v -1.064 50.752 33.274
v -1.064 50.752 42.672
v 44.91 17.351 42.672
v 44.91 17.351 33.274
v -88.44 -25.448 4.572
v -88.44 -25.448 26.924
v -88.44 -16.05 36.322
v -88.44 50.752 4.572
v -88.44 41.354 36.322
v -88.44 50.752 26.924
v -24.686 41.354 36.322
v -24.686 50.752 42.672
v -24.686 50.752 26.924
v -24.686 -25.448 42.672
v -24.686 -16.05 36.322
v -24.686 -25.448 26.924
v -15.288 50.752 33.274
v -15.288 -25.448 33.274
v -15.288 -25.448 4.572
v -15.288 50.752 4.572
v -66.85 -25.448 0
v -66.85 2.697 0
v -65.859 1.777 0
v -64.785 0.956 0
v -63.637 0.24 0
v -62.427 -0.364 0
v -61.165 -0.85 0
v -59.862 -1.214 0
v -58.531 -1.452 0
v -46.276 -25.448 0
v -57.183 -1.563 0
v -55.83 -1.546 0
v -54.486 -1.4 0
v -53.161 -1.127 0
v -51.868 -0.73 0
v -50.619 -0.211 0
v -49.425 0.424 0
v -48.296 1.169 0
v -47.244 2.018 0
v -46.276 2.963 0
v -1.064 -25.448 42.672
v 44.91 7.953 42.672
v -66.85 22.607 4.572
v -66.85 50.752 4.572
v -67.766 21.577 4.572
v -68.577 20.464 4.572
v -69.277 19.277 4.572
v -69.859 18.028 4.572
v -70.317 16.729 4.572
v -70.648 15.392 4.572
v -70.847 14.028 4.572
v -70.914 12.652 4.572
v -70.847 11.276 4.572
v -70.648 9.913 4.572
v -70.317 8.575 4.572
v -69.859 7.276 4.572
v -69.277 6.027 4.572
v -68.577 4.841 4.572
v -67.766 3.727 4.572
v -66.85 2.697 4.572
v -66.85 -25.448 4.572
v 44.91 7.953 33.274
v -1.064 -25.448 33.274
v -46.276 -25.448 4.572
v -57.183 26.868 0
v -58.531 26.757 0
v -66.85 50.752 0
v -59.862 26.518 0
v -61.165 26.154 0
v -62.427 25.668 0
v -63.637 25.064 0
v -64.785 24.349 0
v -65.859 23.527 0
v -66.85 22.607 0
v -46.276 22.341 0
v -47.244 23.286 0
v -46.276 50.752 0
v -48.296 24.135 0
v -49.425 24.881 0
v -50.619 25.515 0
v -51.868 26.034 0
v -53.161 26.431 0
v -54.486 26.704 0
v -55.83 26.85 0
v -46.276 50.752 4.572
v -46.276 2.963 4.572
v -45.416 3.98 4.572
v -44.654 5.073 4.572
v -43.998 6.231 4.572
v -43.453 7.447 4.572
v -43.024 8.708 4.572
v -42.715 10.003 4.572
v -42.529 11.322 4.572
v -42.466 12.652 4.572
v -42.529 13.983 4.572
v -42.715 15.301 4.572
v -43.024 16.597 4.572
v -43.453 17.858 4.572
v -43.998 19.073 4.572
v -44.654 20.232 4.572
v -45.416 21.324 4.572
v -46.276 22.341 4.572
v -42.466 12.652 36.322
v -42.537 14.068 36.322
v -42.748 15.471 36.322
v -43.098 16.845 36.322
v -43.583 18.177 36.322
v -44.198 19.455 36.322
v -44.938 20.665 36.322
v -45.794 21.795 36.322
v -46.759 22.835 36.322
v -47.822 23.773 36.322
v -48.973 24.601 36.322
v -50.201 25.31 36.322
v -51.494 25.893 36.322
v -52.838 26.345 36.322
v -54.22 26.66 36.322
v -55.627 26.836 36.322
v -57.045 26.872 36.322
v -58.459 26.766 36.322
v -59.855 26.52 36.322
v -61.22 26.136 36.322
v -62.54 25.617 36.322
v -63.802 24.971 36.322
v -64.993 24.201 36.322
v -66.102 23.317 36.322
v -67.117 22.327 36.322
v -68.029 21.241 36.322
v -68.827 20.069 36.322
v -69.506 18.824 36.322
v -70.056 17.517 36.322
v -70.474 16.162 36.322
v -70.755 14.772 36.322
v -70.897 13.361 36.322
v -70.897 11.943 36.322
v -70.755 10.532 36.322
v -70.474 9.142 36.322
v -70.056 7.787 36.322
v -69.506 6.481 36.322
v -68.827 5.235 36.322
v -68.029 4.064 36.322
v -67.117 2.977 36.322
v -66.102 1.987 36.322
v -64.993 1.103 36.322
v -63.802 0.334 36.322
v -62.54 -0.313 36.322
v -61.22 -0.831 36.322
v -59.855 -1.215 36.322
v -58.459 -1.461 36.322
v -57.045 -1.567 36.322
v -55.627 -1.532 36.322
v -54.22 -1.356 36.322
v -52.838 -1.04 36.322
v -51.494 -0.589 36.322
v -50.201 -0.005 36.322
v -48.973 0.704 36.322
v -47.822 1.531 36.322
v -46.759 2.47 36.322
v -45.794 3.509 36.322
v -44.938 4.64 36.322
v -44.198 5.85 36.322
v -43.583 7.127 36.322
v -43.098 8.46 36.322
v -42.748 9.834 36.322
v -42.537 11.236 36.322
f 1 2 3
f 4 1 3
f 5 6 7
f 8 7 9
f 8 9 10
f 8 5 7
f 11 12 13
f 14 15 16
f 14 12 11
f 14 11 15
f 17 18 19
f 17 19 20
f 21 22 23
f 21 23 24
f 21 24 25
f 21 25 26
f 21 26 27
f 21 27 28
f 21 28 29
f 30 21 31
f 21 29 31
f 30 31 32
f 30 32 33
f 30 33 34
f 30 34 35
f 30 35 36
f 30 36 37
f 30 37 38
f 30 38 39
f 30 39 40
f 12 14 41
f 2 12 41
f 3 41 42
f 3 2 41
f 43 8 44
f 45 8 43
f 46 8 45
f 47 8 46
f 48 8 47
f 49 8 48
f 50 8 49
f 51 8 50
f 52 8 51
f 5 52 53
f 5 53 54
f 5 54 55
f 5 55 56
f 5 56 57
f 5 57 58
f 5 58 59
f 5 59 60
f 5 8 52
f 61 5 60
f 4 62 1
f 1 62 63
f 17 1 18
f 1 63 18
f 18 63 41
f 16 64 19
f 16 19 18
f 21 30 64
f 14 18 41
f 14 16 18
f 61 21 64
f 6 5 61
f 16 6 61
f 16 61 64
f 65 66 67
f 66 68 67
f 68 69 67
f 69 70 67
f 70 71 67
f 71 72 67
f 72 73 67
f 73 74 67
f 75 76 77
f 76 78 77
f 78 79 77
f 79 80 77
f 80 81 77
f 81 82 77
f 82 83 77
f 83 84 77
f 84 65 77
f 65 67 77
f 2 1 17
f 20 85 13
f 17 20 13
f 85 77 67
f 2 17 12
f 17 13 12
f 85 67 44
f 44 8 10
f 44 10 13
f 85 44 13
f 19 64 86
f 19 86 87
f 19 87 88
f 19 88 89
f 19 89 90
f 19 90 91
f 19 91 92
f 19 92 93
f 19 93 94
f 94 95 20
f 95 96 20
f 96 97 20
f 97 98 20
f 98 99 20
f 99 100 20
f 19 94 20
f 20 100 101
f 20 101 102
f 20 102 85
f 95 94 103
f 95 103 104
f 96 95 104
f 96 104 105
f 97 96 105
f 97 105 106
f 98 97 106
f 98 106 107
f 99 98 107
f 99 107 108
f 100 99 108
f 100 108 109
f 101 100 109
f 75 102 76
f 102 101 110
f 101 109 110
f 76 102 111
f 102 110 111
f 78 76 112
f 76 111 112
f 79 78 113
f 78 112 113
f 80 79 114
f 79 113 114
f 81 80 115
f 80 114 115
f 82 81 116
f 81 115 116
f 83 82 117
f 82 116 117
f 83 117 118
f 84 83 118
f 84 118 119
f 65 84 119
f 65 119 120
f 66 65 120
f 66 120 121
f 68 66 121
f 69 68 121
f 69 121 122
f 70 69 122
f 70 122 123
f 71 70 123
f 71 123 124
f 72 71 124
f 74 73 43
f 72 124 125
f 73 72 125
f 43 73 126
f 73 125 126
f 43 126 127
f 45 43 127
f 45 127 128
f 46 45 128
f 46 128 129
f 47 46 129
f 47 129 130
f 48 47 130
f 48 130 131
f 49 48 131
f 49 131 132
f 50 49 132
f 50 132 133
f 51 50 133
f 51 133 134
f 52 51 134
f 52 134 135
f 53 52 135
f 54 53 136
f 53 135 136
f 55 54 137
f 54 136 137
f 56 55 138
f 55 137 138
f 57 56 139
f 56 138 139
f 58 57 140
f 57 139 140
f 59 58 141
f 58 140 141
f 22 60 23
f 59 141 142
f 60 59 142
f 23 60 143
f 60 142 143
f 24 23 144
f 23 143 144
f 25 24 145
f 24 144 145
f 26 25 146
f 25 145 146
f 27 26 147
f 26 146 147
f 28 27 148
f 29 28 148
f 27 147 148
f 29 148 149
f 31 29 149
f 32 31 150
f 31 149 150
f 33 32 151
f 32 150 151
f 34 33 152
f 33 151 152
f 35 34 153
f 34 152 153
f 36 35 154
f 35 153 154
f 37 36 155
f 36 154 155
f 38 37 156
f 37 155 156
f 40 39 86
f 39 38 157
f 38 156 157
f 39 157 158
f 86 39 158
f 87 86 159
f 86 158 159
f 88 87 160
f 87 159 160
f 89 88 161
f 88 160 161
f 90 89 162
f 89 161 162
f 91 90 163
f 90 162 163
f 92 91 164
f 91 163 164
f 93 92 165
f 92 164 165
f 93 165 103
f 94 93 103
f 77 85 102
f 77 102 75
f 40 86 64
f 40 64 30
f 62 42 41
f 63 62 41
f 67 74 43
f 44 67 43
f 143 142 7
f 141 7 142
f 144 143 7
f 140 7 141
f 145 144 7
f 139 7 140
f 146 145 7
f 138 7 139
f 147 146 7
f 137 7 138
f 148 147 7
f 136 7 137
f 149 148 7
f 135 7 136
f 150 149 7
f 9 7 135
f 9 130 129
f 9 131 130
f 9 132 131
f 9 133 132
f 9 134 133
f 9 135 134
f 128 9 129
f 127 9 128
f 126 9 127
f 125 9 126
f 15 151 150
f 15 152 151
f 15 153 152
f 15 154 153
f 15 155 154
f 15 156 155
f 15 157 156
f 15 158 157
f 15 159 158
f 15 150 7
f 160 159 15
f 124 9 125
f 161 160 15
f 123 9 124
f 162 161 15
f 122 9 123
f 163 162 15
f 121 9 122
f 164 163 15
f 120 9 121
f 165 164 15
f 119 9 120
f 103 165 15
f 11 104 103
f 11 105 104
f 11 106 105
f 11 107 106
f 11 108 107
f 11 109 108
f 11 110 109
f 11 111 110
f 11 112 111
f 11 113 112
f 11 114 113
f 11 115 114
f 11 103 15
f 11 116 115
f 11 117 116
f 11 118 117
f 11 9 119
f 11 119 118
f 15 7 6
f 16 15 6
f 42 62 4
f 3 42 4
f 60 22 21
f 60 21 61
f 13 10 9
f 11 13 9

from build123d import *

# Parameters (mm, degrees)
F0_W      = 133.35
F0_H      = 76.2
F1_DEPTH  = 42.672
F2_W      = 21.59
F2_H      = 4.572
F3_DEPTH  = 76.201
F5_DEPTH  = 42.673
F4_W      = 63.754
F4_H      = 76.2
F6_DEPTH  = 6.35
F3_FACE_W = 76.2
F3_FACE_H = 28.702
F7_DEPTH  = 9.398
F9_DEPTH  = 63.754
F10_R     = 14.224
F11_DEPTH = 36.323


with BuildPart() as f1:
    # F0 (on Top) → F1 (new body)
    with BuildSketch(Plane.XY):
        with Locations((-21.765223, 12.652185)):
            Rectangle(F0_W, F0_H)
    extrude(amount=F1_DEPTH)

    # F2 (on face) → F3 (cut, through all)
    with BuildSketch(Plane.XZ.offset(25.447815)):
        with Locations((-77.645223, 2.286)):
            Rectangle(F2_W, F2_H)
        Polygon((44.909777, 0), (44.909777, 33.274), (-24.686223, 33.274), (-24.686223, 4.572), (-46.276223, 4.572), (-46.276223, 0), align=None)
    extrude(amount=-F3_DEPTH, mode=Mode.SUBTRACT)

    # F4 (on face) → F5 (cut, through all)
    with BuildSketch(Plane.XY.offset(42.672)):
        Polygon((44.909777, 50.752185), (-1.064223, 50.752185), (44.909777, 17.351185), align=None)
        Polygon((44.909777, 7.953185), (-1.064223, -25.447815), (44.909777, -25.447815), align=None)
    extrude(amount=-F5_DEPTH, mode=Mode.SUBTRACT)

    # F4 (on face) → F6 (cut)
    with BuildSketch(Plane.XY.offset(42.672)):
        with Locations((-56.563223, 12.652185)):
            Rectangle(F4_W, F4_H)
    extrude(amount=-F6_DEPTH, mode=Mode.SUBTRACT)

    # F3_face (on face) → F7 (join)
    with BuildSketch(Plane(origin=(-24.686223, 12.652185, 18.923), x_dir=(0, 1, 0), z_dir=(1, 0, 0))):
        Rectangle(F3_FACE_W, F3_FACE_H)
    extrude(amount=F7_DEPTH)

    # F8 (on face) → F9 (cut)
    with BuildSketch(Plane(origin=(-88.440223, 0, 0), x_dir=(0, -1, 0), z_dir=(-1, 0, 0))):
        Polygon((-50.752185, 26.924), (-41.354185, 36.322), (-50.752185, 36.322), align=None)
        Polygon((25.447815, 36.322), (16.049815, 36.322), (25.447815, 26.924), align=None)
    extrude(amount=-F9_DEPTH, mode=Mode.SUBTRACT)

    # F10 (on face) → F11 (cut, through all)
    with BuildSketch(Plane.XY.offset(36.322)):
        with Locations((-56.690223, 12.652185)):
            Circle(F10_R)
    extrude(amount=-F11_DEPTH, mode=Mode.SUBTRACT)


solid = f1.part
